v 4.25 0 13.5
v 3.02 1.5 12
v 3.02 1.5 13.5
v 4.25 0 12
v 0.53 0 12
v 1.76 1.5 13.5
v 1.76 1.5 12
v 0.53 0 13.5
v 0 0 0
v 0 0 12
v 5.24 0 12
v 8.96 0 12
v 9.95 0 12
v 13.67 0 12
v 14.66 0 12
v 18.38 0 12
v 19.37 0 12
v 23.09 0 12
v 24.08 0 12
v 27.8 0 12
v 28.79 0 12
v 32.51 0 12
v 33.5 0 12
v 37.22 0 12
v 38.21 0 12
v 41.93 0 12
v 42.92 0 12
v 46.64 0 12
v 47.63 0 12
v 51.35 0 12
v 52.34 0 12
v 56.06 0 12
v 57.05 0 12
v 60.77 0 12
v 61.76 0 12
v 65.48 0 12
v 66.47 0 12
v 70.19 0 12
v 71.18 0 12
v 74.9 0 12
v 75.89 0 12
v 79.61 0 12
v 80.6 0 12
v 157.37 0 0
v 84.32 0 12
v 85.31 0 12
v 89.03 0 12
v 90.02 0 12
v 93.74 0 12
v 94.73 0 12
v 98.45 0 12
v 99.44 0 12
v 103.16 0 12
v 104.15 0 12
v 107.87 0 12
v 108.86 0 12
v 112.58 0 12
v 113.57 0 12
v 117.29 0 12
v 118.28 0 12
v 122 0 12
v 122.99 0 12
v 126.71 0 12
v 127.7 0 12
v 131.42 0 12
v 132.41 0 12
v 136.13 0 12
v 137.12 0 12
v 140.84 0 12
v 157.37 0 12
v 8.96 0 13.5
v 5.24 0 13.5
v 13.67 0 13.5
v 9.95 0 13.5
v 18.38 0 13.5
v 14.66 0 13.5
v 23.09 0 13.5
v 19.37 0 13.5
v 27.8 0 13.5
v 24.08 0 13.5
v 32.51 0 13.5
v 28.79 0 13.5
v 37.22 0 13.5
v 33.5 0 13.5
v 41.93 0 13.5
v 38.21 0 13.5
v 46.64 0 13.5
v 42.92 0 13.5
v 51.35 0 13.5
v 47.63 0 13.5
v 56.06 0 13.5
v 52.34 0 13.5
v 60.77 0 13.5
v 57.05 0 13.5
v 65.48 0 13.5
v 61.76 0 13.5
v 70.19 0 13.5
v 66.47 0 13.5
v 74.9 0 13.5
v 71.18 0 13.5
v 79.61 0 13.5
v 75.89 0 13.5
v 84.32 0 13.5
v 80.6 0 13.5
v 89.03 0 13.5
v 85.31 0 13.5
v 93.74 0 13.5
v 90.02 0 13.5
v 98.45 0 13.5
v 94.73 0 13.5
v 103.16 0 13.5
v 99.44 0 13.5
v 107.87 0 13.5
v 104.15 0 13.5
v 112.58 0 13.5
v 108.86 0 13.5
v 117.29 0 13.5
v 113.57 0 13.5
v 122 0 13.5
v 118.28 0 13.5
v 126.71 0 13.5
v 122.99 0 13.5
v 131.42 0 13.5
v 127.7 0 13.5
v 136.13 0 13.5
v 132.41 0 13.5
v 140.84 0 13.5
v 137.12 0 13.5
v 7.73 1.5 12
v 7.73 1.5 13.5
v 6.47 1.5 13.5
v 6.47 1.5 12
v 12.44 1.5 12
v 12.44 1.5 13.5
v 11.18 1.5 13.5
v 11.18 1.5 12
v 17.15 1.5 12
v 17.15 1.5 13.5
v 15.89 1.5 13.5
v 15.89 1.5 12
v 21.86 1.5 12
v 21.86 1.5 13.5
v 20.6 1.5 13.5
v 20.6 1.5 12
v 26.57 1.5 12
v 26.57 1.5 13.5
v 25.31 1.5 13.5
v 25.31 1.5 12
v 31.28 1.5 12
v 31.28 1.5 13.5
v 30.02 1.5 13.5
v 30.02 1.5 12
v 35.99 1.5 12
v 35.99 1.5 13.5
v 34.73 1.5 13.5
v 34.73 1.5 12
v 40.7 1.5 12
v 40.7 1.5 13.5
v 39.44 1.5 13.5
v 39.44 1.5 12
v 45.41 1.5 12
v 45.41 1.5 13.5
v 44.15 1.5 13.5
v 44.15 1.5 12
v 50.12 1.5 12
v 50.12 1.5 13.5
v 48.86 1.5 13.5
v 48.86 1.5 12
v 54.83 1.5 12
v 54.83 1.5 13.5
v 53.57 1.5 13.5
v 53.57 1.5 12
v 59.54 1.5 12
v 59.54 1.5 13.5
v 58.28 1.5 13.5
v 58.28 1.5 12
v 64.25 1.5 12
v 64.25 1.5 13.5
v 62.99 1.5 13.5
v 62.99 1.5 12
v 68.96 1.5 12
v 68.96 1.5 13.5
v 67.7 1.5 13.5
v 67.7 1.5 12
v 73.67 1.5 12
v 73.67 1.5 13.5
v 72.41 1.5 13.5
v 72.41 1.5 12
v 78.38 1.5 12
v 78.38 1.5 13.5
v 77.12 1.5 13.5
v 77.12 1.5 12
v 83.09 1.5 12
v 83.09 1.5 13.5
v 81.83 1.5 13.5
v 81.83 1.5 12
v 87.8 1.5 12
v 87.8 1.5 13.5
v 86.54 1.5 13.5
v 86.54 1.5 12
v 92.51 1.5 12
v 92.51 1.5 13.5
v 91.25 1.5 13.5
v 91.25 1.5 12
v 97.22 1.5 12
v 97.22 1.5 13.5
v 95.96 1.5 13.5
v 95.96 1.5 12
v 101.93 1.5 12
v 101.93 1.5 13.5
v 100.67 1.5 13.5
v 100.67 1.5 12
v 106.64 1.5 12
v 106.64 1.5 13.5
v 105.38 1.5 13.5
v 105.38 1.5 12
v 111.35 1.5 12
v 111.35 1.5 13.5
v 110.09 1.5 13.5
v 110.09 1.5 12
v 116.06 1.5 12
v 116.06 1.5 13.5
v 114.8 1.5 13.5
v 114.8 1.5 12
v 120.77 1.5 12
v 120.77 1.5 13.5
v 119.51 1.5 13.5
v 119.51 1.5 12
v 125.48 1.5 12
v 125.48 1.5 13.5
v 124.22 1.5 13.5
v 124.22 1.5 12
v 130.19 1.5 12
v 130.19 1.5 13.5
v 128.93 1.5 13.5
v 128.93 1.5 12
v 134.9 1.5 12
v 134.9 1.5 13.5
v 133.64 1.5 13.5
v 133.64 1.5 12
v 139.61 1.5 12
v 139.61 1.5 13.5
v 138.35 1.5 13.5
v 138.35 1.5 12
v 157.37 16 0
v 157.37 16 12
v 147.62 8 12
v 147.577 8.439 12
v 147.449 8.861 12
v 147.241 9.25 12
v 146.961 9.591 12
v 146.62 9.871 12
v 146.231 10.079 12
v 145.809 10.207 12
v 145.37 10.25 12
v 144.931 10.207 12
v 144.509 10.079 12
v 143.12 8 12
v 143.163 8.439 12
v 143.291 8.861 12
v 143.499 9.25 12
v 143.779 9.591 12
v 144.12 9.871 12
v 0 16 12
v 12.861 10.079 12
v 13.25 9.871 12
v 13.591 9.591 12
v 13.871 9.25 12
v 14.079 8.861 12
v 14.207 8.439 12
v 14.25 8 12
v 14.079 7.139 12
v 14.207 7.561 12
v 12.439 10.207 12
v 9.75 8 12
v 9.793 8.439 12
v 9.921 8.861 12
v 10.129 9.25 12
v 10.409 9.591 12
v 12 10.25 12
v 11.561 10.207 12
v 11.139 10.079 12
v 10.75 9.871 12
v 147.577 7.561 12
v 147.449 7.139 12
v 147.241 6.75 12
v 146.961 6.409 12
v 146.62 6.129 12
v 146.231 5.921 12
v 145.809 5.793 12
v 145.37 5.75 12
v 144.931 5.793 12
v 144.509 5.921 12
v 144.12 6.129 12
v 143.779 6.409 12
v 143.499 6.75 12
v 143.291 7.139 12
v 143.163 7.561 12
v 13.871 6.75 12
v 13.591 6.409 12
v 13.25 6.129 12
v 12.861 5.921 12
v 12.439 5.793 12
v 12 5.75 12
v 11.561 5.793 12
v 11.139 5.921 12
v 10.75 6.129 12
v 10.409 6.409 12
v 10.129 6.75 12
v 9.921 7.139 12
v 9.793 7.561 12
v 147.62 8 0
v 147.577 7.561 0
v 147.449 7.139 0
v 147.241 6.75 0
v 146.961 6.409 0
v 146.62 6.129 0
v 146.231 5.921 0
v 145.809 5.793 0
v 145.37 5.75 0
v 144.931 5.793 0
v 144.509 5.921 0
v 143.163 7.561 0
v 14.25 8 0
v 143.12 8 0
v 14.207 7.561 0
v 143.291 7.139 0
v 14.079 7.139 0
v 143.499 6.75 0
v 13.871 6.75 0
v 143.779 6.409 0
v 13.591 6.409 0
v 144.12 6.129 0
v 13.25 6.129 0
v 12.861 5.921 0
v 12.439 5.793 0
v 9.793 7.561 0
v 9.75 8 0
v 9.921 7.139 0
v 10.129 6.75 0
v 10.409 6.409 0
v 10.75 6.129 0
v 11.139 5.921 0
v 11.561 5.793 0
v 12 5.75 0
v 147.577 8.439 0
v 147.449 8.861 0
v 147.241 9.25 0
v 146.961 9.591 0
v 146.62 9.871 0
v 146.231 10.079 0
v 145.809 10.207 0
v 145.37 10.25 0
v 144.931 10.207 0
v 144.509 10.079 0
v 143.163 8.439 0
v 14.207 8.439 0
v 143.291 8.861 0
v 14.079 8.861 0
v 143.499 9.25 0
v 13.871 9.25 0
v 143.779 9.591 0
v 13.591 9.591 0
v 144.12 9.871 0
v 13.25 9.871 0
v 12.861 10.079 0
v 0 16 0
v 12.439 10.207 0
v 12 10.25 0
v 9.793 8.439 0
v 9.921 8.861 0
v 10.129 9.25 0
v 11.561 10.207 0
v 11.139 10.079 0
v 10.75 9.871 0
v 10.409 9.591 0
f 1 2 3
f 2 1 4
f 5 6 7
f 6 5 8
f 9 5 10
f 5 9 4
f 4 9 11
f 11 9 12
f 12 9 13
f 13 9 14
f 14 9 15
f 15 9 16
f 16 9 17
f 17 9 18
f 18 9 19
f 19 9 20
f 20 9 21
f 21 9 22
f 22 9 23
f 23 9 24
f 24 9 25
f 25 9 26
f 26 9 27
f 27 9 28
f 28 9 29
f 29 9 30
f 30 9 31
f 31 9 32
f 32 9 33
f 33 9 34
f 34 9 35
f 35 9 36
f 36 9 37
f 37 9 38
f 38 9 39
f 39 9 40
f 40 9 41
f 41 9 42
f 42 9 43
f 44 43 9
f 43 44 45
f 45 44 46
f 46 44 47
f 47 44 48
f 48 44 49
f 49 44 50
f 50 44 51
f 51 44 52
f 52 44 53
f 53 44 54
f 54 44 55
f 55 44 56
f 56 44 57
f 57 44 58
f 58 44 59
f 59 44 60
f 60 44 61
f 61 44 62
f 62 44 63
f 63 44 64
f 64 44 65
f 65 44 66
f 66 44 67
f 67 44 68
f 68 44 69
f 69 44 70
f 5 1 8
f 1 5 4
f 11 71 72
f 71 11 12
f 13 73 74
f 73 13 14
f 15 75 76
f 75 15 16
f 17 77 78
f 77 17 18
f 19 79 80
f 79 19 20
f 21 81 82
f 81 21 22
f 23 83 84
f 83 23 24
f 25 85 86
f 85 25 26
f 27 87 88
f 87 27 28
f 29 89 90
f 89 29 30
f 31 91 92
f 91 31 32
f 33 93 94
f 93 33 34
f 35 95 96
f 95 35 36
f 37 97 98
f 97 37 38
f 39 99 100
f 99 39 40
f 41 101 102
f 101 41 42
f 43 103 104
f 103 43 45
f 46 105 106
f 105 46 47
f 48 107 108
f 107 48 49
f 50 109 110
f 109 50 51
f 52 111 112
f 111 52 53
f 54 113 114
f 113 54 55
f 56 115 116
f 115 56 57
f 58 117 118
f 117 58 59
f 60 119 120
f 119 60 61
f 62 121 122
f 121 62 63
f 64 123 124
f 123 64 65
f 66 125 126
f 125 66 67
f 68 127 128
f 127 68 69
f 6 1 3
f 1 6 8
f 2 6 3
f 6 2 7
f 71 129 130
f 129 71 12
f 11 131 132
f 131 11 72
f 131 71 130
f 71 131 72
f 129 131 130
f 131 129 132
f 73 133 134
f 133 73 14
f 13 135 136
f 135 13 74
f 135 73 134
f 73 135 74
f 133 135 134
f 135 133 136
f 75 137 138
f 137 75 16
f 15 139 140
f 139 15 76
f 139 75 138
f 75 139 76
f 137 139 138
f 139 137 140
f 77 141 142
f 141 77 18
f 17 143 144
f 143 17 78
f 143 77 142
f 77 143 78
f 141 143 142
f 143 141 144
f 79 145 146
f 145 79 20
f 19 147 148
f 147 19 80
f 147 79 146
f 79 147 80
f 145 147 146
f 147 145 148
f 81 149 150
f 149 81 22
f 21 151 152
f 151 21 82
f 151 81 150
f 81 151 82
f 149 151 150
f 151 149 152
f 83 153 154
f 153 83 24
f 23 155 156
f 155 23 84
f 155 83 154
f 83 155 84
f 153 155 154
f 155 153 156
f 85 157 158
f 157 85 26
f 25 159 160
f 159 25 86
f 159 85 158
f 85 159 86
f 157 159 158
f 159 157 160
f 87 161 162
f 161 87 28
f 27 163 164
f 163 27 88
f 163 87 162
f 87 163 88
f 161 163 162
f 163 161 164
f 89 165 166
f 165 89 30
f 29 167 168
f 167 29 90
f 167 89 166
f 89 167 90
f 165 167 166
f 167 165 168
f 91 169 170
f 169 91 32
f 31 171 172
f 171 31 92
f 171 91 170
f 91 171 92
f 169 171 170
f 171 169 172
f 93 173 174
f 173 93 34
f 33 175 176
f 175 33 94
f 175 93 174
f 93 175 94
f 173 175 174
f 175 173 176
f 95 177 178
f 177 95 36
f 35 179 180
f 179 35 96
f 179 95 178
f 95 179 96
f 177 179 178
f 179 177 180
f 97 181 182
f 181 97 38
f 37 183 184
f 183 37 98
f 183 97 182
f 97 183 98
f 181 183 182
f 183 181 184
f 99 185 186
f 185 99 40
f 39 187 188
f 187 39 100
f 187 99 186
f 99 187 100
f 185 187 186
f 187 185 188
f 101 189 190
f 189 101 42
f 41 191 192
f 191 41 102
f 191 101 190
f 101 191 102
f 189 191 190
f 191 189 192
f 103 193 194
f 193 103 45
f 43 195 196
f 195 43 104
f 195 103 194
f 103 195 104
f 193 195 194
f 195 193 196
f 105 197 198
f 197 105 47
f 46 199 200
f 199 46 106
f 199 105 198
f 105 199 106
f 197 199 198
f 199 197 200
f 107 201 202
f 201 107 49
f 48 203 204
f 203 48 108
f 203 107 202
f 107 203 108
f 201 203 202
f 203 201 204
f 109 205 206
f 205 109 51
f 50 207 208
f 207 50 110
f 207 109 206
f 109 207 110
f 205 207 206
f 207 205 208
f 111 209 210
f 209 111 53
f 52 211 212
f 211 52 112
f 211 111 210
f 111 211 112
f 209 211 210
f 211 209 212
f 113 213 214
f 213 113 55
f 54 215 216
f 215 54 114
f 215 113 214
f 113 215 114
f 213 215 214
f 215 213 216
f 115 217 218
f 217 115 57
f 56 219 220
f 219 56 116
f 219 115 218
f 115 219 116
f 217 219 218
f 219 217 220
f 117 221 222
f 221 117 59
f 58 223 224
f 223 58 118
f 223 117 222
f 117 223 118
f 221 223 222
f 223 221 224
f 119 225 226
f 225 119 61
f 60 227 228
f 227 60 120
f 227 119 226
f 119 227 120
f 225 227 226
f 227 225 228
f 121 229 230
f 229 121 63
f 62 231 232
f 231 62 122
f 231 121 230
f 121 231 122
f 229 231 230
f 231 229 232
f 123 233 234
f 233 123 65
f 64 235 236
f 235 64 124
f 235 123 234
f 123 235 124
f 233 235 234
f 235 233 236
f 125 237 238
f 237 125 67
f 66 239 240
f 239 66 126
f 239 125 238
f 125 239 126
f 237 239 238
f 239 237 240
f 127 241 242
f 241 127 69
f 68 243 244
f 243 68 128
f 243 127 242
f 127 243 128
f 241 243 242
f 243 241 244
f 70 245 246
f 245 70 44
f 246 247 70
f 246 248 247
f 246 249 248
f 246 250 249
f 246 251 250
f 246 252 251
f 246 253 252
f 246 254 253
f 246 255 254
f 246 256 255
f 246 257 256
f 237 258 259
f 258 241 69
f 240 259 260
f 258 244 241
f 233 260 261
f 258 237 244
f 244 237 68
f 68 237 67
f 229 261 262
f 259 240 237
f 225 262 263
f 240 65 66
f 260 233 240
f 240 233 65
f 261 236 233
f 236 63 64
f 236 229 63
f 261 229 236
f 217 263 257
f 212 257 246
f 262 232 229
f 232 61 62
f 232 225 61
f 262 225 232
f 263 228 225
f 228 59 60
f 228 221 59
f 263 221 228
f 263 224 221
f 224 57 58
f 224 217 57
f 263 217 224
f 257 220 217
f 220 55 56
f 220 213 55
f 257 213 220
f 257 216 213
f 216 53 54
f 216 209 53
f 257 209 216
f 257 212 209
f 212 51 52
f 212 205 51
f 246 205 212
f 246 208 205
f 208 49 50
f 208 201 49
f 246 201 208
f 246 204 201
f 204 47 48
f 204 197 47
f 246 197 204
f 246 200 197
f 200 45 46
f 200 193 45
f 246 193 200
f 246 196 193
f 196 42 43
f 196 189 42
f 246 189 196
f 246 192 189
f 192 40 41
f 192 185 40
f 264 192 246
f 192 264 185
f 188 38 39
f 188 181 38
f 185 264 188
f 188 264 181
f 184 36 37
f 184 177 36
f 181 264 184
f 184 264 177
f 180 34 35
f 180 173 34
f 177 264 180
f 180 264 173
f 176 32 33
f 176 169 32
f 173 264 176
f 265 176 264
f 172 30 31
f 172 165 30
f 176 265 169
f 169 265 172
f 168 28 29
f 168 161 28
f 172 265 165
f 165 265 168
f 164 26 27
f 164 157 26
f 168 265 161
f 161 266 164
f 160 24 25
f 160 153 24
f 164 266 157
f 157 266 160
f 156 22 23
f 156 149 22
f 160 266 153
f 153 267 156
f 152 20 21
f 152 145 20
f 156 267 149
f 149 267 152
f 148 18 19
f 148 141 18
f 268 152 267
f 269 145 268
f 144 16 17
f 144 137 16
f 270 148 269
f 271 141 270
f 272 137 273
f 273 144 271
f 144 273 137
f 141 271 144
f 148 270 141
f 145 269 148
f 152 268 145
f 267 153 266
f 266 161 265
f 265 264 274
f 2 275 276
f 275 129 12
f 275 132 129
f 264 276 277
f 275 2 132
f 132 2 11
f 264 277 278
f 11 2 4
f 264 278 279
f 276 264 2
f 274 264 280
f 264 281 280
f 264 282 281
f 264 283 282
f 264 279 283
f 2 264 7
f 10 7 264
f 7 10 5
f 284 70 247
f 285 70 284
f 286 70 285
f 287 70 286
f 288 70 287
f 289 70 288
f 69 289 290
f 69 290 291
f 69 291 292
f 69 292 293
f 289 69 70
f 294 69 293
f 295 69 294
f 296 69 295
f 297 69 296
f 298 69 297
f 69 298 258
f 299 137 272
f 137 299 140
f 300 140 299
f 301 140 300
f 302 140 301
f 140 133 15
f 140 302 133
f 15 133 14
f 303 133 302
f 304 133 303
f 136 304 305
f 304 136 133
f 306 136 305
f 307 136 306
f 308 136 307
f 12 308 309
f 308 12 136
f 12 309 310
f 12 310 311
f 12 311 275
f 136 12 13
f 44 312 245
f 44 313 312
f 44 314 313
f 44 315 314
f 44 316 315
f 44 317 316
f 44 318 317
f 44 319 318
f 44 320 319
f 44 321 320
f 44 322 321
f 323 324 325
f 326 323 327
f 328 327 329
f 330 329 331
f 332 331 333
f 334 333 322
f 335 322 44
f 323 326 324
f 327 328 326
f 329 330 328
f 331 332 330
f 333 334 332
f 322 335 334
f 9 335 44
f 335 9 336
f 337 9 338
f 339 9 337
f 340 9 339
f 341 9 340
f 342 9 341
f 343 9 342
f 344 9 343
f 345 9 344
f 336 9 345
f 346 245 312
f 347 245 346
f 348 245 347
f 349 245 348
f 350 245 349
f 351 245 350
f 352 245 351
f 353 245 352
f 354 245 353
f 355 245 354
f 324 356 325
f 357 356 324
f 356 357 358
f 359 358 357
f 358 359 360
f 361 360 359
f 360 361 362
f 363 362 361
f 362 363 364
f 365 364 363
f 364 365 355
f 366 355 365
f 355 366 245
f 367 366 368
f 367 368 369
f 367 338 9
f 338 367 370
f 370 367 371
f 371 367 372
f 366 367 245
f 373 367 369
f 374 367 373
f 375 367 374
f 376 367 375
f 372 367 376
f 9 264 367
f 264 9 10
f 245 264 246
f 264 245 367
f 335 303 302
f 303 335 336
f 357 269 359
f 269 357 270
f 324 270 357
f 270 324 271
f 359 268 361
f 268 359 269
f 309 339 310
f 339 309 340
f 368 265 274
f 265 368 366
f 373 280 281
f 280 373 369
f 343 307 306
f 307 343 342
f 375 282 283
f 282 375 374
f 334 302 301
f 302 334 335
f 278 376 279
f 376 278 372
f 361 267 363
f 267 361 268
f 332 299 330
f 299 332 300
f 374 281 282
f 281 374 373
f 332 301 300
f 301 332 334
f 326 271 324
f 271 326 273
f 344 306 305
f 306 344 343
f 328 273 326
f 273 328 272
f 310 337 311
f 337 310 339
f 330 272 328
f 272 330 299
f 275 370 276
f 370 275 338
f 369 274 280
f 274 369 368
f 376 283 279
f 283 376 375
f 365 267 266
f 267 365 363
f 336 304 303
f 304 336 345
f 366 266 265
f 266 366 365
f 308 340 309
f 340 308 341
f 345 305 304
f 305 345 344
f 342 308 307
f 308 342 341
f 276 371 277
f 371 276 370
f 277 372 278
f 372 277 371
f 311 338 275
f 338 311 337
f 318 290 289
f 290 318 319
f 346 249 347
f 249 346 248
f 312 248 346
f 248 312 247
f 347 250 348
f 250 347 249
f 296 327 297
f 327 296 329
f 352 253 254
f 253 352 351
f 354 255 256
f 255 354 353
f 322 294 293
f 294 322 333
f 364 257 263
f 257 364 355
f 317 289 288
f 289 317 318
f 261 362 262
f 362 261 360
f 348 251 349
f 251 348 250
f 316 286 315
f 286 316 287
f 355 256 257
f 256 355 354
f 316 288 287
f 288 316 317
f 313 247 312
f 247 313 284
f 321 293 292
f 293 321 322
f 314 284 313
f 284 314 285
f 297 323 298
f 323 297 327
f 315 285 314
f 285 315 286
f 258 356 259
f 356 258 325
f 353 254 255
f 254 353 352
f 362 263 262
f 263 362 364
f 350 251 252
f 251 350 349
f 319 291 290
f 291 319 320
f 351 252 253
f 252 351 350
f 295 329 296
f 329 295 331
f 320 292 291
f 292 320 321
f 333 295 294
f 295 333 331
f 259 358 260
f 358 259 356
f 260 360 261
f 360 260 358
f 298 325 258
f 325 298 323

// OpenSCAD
$fn = 32;

// ----------------------------------------------------------------------
// Gear rack: m=1.5 z=30, 157.37 x 16 x 13.5 mm
// ----------------------------------------------------------------------

// --- parameters (mm) ---
bar_len = 157.37;         // rack length, X
bar_w = 16;               // rack width, Y
bar_h = 13.5;             // overall height, Z
gear_module = 1.5;        // module
base_t = 12;              // tooth root line height
pitch = 4.71;             // circular pitch
tip_w = 1.26;             // tooth thickness at the tip
root_w = 3.72;            // tooth thickness at the root line
hole_d = 4.5;             // mounting hole
sink = 0.6;               // tooth root overlap into the body

tooth_span = 141.37;

module tooth(x0) {
  /* 20 deg flank profile, sunk into the body for a positive overlap */
  translate([x0, 0, base_t - sink])
    linear_extrude(height = bar_h - base_t + sink)
      polygon(points = [[-root_w / 2, 0], [root_w / 2, 0],
                        [tip_w / 2, bar_h - base_t],
                        [-tip_w / 2, bar_h - base_t]]);
}

difference() {
  union() {
    cube([bar_len, bar_w, base_t]);
    for (i = [0 : 30 - 1])
      tooth((i + 0.5) * pitch + (tooth_span - 30 * pitch) / 2);
  }
  translate([12, 8, -1]) cylinder(h = base_t + 2, d = hole_d);
  translate([145.37, 8, -1]) cylinder(h = base_t + 2, d = hole_d);
}
